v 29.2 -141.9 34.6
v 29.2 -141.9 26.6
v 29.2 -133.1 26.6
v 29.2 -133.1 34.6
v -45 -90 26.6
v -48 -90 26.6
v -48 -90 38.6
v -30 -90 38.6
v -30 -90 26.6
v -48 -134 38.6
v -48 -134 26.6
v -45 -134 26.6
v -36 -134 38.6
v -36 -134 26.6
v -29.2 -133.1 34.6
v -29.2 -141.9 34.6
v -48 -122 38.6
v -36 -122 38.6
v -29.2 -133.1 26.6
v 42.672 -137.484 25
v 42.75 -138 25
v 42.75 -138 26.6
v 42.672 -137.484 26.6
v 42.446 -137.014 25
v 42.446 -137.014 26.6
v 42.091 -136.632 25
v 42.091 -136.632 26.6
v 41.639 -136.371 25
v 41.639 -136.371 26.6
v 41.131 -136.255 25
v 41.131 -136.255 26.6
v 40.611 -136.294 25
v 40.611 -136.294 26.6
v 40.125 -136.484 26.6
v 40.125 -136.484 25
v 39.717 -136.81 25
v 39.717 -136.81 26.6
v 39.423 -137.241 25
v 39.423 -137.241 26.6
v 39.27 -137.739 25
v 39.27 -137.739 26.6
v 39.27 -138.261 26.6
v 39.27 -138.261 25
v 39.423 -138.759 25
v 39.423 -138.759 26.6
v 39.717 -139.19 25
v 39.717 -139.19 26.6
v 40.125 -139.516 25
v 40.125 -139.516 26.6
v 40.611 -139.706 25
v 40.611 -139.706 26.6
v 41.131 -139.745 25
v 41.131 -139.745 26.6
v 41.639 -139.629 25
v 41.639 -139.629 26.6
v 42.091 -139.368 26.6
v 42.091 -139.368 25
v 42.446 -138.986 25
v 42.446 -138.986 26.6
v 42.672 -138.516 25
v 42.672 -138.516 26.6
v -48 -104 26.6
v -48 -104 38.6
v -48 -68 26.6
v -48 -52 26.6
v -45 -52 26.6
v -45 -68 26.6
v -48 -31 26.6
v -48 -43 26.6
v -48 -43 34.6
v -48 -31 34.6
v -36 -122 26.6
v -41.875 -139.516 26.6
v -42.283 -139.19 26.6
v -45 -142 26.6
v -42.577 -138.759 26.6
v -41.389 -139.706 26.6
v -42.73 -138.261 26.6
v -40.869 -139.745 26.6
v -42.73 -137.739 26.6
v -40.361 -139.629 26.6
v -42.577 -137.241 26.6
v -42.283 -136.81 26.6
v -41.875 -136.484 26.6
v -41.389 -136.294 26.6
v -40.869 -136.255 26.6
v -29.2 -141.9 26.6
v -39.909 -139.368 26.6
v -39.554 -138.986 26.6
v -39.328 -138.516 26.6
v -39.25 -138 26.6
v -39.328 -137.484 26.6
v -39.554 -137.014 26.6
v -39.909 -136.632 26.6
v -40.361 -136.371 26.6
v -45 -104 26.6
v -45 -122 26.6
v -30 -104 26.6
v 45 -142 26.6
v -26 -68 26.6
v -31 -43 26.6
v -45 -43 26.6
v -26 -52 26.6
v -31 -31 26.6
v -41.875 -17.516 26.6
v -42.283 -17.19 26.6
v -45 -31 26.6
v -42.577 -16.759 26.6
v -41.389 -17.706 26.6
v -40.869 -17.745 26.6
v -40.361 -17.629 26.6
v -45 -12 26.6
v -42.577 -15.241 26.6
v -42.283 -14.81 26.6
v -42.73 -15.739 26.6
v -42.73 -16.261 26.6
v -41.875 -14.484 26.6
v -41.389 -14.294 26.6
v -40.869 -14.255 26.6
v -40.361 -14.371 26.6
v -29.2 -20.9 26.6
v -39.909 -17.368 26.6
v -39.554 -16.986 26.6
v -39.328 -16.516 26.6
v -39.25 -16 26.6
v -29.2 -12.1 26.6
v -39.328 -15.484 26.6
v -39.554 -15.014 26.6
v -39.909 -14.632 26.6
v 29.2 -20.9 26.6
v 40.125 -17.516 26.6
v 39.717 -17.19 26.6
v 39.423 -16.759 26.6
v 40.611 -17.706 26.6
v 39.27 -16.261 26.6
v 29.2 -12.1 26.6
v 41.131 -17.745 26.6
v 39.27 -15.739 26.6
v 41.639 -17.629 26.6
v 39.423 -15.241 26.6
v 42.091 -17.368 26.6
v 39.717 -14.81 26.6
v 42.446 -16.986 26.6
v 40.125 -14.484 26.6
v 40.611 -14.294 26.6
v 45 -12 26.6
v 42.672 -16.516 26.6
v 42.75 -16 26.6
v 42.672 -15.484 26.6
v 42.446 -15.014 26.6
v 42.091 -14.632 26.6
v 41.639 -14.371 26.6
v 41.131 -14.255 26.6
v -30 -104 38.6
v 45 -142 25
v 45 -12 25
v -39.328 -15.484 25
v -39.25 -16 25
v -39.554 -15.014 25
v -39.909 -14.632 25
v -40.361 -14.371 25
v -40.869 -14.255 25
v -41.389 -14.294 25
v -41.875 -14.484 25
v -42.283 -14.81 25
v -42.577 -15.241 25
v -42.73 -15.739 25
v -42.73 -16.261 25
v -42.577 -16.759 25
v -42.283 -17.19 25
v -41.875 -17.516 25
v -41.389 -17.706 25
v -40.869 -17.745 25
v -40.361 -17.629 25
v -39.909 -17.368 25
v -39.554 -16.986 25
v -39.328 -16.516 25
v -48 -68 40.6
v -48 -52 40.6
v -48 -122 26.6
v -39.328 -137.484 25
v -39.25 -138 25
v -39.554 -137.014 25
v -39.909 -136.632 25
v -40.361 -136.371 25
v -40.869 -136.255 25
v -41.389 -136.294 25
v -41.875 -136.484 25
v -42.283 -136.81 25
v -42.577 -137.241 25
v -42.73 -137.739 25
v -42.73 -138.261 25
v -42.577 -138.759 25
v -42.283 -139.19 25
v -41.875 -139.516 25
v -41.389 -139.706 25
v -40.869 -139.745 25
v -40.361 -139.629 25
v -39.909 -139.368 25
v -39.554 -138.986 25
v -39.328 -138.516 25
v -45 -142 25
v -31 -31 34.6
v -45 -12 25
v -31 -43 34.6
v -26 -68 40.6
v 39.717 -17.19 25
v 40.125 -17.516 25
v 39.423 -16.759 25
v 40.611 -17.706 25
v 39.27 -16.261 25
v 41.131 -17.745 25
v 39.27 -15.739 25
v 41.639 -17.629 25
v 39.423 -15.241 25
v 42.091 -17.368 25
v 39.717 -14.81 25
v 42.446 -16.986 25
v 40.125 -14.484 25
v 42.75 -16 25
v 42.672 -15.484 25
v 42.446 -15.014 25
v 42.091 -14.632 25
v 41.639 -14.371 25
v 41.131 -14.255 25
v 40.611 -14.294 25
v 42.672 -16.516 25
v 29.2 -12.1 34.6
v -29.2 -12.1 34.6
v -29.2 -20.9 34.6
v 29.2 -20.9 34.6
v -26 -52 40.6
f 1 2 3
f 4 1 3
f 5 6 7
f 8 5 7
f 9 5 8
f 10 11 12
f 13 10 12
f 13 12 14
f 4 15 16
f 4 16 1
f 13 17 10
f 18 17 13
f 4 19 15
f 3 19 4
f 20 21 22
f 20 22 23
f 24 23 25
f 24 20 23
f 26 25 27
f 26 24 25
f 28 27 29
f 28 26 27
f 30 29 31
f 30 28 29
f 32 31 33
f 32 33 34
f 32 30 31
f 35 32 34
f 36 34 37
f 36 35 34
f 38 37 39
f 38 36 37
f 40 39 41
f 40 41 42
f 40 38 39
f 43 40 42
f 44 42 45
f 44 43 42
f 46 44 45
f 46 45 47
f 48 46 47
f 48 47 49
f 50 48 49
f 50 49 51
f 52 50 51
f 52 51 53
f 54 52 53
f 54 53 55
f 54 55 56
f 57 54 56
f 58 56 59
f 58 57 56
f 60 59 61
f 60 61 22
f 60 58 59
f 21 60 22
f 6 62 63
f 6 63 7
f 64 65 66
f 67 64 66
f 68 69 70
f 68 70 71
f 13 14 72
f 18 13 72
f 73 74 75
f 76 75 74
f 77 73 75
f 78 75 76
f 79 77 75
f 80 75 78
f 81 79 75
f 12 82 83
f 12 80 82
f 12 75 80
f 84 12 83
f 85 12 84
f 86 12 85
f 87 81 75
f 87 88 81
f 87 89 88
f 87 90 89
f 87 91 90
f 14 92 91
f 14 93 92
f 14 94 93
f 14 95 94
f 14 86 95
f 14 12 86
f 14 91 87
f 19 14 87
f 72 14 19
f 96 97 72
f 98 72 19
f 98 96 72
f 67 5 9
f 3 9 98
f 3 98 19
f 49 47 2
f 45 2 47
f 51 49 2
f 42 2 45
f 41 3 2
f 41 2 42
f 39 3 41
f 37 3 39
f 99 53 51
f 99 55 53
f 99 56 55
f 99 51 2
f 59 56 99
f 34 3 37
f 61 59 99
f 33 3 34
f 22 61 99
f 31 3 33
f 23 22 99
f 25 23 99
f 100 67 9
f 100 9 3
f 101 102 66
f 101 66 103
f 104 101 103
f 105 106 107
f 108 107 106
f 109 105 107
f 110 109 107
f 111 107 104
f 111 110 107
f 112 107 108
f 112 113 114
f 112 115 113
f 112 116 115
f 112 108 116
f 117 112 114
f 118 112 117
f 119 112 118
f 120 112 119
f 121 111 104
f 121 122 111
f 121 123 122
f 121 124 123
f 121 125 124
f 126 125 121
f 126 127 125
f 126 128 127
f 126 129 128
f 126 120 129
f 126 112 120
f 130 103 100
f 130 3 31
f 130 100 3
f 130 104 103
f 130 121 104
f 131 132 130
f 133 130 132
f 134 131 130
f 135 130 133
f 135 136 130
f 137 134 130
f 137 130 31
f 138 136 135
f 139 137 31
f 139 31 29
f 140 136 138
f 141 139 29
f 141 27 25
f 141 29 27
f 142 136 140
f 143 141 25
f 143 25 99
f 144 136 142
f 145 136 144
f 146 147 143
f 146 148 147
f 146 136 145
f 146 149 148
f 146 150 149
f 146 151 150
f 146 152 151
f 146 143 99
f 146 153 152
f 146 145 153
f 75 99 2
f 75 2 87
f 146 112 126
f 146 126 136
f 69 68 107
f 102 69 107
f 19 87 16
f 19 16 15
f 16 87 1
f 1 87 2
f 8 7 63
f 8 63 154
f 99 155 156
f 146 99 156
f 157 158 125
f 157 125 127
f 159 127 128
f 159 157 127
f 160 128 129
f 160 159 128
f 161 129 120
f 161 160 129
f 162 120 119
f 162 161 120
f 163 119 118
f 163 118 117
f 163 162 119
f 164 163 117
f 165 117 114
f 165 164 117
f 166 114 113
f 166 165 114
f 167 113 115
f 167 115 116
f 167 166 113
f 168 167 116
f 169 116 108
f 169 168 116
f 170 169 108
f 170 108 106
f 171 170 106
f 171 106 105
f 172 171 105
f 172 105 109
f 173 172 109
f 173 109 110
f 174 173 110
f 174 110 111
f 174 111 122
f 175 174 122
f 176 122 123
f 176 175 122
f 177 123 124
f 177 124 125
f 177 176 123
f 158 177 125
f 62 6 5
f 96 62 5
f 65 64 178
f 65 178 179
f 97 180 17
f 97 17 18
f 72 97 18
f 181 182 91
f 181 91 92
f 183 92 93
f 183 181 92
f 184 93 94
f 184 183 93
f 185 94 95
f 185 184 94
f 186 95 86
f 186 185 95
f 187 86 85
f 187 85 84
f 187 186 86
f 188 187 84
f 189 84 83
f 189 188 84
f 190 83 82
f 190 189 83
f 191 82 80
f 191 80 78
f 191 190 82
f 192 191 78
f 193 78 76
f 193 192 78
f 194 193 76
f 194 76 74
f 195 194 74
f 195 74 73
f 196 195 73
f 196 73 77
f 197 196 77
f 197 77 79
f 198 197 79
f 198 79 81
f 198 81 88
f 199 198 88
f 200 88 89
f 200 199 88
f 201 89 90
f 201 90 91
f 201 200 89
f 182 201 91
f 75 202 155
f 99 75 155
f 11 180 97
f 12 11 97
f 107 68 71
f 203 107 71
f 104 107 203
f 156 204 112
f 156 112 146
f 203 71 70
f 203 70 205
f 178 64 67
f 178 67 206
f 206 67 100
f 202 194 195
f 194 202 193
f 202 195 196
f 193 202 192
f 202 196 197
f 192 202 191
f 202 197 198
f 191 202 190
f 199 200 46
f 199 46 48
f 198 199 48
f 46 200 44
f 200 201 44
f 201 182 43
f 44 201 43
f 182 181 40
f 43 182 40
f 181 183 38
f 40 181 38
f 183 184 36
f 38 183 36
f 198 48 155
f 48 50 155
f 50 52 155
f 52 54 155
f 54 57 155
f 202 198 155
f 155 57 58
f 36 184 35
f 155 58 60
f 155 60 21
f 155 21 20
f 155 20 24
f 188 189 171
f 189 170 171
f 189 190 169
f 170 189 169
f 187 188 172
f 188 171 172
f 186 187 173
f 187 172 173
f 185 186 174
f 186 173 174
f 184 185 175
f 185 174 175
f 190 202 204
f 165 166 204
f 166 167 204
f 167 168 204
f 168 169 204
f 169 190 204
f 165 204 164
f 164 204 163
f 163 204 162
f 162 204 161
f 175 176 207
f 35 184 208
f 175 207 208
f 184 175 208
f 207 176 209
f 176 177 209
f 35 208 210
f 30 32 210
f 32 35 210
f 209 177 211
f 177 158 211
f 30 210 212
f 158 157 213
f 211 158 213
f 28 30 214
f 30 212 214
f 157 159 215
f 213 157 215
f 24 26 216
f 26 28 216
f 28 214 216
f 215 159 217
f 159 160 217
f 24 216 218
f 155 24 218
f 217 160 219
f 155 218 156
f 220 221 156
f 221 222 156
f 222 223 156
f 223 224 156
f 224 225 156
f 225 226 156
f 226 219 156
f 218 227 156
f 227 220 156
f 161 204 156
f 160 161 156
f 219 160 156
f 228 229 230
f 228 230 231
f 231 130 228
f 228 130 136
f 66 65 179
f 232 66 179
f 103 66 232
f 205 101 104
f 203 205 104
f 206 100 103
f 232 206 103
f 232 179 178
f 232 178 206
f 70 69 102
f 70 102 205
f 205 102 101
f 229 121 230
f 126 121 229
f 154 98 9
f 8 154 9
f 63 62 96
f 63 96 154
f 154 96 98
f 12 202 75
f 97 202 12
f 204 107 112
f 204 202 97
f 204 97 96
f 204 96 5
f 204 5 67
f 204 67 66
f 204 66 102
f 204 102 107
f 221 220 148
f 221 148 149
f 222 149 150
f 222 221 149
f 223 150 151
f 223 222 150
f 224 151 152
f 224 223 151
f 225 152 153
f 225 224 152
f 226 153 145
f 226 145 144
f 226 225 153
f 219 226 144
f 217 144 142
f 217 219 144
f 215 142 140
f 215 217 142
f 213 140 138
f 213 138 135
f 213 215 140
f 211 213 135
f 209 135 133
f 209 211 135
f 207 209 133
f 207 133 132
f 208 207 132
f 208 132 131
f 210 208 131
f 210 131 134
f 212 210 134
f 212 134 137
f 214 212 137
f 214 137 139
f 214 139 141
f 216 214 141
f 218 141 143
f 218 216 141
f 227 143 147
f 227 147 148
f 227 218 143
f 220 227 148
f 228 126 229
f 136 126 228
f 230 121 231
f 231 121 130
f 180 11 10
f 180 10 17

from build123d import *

# Parameters (mm, degrees)
AX_PCB_FLAT_FRONT_COMPARTMENT_START        = 25
SKETCH_1_W                                 = 90
SKETCH_1_H                                 = 130
SKETCH_1_R                                 = 1.75
AX_PCB_FLAT_FRONT_COMPARTMENT_DEPTH        = 1.6
J10_FRONT_CAMERA_HEADER_START              = 26.6
SKETCH_2_W                                 = 58.4
SKETCH_2_H                                 = 8.8
J10_FRONT_CAMERA_HEADER_DEPTH              = 8
J11_REAR_IDC40_START                       = 26.6
SKETCH_3_W                                 = 58.4
SKETCH_3_H                                 = 8.8
J11_REAR_IDC40_DEPTH                       = 8
HDMI_LEFT_START                            = 26.6
SKETCH_5_W                                 = 17
SKETCH_5_H                                 = 12
HDMI_LEFT_DEPTH                            = 8
USB_HOST_LEFT_START                        = 26.6
SKETCH_6_W                                 = 18
SKETCH_6_H                                 = 14
USB_HOST_LEFT_DEPTH                        = 12
RJ45_LEFT_START                            = 26.6
SKETCH_7_W                                 = 22
SKETCH_7_H                                 = 16
RJ45_LEFT_DEPTH                            = 14
DC5521_APPROX_BODY_CLEAR_CAMERA_EDGE_START = 26.6
SKETCH_8_W                                 = 12
SKETCH_8_H                                 = 12
DC5521_APPROX_BODY_CLEAR_CAMERA_EDGE_DEPTH = 12


with BuildPart() as part:
    # 草图1 → AX_PCB_flat_front_compartment (new body)
    with BuildSketch(Plane.XY.offset(AX_PCB_FLAT_FRONT_COMPARTMENT_START)):
        with Locations((0, -77)):
            Rectangle(SKETCH_1_W, SKETCH_1_H)
        with Locations((-41, -138)):
            Circle(SKETCH_1_R, mode=Mode.SUBTRACT)
        with Locations((41, -138)):
            Circle(SKETCH_1_R, mode=Mode.SUBTRACT)
        with Locations((41, -16)):
            Circle(SKETCH_1_R, mode=Mode.SUBTRACT)
        with Locations((-41, -16)):
            Circle(SKETCH_1_R, mode=Mode.SUBTRACT)
    extrude(amount=AX_PCB_FLAT_FRONT_COMPARTMENT_DEPTH)

    # 草图2 → J10_front_camera_header (add)
    with BuildSketch(Plane.XY.offset(J10_FRONT_CAMERA_HEADER_START)):
        with Locations((0, -137.5)):
            Rectangle(SKETCH_2_W, SKETCH_2_H)
    extrude(amount=J10_FRONT_CAMERA_HEADER_DEPTH)

    # 草图3 → J11_rear_IDC40 (add)
    with BuildSketch(Plane.XY.offset(J11_REAR_IDC40_START)):
        with Locations((0, -16.5)):
            Rectangle(SKETCH_3_W, SKETCH_3_H)
    extrude(amount=J11_REAR_IDC40_DEPTH)

    # 草图5 → HDMI_left (add)
    with BuildSketch(Plane.XY.offset(HDMI_LEFT_START)):
        with Locations((-39.5, -37)):
            Rectangle(SKETCH_5_W, SKETCH_5_H)
    extrude(amount=HDMI_LEFT_DEPTH)

    # 草图6 → USB_HOST_left (add)
    with BuildSketch(Plane.XY.offset(USB_HOST_LEFT_START)):
        with Locations((-39, -97)):
            Rectangle(SKETCH_6_W, SKETCH_6_H)
    extrude(amount=USB_HOST_LEFT_DEPTH)

    # 草图7 → RJ45_left (add)
    with BuildSketch(Plane.XY.offset(RJ45_LEFT_START)):
        with Locations((-37, -60)):
            Rectangle(SKETCH_7_W, SKETCH_7_H)
    extrude(amount=RJ45_LEFT_DEPTH)

    # 草图8 → DC5521_approx_body_clear_camera_edge (add)
    with BuildSketch(Plane.XY.offset(DC5521_APPROX_BODY_CLEAR_CAMERA_EDGE_START)):
        with Locations((-42, -128)):
            Rectangle(SKETCH_8_W, SKETCH_8_H)
    extrude(amount=DC5521_APPROX_BODY_CLEAR_CAMERA_EDGE_DEPTH)


solid = part.part
